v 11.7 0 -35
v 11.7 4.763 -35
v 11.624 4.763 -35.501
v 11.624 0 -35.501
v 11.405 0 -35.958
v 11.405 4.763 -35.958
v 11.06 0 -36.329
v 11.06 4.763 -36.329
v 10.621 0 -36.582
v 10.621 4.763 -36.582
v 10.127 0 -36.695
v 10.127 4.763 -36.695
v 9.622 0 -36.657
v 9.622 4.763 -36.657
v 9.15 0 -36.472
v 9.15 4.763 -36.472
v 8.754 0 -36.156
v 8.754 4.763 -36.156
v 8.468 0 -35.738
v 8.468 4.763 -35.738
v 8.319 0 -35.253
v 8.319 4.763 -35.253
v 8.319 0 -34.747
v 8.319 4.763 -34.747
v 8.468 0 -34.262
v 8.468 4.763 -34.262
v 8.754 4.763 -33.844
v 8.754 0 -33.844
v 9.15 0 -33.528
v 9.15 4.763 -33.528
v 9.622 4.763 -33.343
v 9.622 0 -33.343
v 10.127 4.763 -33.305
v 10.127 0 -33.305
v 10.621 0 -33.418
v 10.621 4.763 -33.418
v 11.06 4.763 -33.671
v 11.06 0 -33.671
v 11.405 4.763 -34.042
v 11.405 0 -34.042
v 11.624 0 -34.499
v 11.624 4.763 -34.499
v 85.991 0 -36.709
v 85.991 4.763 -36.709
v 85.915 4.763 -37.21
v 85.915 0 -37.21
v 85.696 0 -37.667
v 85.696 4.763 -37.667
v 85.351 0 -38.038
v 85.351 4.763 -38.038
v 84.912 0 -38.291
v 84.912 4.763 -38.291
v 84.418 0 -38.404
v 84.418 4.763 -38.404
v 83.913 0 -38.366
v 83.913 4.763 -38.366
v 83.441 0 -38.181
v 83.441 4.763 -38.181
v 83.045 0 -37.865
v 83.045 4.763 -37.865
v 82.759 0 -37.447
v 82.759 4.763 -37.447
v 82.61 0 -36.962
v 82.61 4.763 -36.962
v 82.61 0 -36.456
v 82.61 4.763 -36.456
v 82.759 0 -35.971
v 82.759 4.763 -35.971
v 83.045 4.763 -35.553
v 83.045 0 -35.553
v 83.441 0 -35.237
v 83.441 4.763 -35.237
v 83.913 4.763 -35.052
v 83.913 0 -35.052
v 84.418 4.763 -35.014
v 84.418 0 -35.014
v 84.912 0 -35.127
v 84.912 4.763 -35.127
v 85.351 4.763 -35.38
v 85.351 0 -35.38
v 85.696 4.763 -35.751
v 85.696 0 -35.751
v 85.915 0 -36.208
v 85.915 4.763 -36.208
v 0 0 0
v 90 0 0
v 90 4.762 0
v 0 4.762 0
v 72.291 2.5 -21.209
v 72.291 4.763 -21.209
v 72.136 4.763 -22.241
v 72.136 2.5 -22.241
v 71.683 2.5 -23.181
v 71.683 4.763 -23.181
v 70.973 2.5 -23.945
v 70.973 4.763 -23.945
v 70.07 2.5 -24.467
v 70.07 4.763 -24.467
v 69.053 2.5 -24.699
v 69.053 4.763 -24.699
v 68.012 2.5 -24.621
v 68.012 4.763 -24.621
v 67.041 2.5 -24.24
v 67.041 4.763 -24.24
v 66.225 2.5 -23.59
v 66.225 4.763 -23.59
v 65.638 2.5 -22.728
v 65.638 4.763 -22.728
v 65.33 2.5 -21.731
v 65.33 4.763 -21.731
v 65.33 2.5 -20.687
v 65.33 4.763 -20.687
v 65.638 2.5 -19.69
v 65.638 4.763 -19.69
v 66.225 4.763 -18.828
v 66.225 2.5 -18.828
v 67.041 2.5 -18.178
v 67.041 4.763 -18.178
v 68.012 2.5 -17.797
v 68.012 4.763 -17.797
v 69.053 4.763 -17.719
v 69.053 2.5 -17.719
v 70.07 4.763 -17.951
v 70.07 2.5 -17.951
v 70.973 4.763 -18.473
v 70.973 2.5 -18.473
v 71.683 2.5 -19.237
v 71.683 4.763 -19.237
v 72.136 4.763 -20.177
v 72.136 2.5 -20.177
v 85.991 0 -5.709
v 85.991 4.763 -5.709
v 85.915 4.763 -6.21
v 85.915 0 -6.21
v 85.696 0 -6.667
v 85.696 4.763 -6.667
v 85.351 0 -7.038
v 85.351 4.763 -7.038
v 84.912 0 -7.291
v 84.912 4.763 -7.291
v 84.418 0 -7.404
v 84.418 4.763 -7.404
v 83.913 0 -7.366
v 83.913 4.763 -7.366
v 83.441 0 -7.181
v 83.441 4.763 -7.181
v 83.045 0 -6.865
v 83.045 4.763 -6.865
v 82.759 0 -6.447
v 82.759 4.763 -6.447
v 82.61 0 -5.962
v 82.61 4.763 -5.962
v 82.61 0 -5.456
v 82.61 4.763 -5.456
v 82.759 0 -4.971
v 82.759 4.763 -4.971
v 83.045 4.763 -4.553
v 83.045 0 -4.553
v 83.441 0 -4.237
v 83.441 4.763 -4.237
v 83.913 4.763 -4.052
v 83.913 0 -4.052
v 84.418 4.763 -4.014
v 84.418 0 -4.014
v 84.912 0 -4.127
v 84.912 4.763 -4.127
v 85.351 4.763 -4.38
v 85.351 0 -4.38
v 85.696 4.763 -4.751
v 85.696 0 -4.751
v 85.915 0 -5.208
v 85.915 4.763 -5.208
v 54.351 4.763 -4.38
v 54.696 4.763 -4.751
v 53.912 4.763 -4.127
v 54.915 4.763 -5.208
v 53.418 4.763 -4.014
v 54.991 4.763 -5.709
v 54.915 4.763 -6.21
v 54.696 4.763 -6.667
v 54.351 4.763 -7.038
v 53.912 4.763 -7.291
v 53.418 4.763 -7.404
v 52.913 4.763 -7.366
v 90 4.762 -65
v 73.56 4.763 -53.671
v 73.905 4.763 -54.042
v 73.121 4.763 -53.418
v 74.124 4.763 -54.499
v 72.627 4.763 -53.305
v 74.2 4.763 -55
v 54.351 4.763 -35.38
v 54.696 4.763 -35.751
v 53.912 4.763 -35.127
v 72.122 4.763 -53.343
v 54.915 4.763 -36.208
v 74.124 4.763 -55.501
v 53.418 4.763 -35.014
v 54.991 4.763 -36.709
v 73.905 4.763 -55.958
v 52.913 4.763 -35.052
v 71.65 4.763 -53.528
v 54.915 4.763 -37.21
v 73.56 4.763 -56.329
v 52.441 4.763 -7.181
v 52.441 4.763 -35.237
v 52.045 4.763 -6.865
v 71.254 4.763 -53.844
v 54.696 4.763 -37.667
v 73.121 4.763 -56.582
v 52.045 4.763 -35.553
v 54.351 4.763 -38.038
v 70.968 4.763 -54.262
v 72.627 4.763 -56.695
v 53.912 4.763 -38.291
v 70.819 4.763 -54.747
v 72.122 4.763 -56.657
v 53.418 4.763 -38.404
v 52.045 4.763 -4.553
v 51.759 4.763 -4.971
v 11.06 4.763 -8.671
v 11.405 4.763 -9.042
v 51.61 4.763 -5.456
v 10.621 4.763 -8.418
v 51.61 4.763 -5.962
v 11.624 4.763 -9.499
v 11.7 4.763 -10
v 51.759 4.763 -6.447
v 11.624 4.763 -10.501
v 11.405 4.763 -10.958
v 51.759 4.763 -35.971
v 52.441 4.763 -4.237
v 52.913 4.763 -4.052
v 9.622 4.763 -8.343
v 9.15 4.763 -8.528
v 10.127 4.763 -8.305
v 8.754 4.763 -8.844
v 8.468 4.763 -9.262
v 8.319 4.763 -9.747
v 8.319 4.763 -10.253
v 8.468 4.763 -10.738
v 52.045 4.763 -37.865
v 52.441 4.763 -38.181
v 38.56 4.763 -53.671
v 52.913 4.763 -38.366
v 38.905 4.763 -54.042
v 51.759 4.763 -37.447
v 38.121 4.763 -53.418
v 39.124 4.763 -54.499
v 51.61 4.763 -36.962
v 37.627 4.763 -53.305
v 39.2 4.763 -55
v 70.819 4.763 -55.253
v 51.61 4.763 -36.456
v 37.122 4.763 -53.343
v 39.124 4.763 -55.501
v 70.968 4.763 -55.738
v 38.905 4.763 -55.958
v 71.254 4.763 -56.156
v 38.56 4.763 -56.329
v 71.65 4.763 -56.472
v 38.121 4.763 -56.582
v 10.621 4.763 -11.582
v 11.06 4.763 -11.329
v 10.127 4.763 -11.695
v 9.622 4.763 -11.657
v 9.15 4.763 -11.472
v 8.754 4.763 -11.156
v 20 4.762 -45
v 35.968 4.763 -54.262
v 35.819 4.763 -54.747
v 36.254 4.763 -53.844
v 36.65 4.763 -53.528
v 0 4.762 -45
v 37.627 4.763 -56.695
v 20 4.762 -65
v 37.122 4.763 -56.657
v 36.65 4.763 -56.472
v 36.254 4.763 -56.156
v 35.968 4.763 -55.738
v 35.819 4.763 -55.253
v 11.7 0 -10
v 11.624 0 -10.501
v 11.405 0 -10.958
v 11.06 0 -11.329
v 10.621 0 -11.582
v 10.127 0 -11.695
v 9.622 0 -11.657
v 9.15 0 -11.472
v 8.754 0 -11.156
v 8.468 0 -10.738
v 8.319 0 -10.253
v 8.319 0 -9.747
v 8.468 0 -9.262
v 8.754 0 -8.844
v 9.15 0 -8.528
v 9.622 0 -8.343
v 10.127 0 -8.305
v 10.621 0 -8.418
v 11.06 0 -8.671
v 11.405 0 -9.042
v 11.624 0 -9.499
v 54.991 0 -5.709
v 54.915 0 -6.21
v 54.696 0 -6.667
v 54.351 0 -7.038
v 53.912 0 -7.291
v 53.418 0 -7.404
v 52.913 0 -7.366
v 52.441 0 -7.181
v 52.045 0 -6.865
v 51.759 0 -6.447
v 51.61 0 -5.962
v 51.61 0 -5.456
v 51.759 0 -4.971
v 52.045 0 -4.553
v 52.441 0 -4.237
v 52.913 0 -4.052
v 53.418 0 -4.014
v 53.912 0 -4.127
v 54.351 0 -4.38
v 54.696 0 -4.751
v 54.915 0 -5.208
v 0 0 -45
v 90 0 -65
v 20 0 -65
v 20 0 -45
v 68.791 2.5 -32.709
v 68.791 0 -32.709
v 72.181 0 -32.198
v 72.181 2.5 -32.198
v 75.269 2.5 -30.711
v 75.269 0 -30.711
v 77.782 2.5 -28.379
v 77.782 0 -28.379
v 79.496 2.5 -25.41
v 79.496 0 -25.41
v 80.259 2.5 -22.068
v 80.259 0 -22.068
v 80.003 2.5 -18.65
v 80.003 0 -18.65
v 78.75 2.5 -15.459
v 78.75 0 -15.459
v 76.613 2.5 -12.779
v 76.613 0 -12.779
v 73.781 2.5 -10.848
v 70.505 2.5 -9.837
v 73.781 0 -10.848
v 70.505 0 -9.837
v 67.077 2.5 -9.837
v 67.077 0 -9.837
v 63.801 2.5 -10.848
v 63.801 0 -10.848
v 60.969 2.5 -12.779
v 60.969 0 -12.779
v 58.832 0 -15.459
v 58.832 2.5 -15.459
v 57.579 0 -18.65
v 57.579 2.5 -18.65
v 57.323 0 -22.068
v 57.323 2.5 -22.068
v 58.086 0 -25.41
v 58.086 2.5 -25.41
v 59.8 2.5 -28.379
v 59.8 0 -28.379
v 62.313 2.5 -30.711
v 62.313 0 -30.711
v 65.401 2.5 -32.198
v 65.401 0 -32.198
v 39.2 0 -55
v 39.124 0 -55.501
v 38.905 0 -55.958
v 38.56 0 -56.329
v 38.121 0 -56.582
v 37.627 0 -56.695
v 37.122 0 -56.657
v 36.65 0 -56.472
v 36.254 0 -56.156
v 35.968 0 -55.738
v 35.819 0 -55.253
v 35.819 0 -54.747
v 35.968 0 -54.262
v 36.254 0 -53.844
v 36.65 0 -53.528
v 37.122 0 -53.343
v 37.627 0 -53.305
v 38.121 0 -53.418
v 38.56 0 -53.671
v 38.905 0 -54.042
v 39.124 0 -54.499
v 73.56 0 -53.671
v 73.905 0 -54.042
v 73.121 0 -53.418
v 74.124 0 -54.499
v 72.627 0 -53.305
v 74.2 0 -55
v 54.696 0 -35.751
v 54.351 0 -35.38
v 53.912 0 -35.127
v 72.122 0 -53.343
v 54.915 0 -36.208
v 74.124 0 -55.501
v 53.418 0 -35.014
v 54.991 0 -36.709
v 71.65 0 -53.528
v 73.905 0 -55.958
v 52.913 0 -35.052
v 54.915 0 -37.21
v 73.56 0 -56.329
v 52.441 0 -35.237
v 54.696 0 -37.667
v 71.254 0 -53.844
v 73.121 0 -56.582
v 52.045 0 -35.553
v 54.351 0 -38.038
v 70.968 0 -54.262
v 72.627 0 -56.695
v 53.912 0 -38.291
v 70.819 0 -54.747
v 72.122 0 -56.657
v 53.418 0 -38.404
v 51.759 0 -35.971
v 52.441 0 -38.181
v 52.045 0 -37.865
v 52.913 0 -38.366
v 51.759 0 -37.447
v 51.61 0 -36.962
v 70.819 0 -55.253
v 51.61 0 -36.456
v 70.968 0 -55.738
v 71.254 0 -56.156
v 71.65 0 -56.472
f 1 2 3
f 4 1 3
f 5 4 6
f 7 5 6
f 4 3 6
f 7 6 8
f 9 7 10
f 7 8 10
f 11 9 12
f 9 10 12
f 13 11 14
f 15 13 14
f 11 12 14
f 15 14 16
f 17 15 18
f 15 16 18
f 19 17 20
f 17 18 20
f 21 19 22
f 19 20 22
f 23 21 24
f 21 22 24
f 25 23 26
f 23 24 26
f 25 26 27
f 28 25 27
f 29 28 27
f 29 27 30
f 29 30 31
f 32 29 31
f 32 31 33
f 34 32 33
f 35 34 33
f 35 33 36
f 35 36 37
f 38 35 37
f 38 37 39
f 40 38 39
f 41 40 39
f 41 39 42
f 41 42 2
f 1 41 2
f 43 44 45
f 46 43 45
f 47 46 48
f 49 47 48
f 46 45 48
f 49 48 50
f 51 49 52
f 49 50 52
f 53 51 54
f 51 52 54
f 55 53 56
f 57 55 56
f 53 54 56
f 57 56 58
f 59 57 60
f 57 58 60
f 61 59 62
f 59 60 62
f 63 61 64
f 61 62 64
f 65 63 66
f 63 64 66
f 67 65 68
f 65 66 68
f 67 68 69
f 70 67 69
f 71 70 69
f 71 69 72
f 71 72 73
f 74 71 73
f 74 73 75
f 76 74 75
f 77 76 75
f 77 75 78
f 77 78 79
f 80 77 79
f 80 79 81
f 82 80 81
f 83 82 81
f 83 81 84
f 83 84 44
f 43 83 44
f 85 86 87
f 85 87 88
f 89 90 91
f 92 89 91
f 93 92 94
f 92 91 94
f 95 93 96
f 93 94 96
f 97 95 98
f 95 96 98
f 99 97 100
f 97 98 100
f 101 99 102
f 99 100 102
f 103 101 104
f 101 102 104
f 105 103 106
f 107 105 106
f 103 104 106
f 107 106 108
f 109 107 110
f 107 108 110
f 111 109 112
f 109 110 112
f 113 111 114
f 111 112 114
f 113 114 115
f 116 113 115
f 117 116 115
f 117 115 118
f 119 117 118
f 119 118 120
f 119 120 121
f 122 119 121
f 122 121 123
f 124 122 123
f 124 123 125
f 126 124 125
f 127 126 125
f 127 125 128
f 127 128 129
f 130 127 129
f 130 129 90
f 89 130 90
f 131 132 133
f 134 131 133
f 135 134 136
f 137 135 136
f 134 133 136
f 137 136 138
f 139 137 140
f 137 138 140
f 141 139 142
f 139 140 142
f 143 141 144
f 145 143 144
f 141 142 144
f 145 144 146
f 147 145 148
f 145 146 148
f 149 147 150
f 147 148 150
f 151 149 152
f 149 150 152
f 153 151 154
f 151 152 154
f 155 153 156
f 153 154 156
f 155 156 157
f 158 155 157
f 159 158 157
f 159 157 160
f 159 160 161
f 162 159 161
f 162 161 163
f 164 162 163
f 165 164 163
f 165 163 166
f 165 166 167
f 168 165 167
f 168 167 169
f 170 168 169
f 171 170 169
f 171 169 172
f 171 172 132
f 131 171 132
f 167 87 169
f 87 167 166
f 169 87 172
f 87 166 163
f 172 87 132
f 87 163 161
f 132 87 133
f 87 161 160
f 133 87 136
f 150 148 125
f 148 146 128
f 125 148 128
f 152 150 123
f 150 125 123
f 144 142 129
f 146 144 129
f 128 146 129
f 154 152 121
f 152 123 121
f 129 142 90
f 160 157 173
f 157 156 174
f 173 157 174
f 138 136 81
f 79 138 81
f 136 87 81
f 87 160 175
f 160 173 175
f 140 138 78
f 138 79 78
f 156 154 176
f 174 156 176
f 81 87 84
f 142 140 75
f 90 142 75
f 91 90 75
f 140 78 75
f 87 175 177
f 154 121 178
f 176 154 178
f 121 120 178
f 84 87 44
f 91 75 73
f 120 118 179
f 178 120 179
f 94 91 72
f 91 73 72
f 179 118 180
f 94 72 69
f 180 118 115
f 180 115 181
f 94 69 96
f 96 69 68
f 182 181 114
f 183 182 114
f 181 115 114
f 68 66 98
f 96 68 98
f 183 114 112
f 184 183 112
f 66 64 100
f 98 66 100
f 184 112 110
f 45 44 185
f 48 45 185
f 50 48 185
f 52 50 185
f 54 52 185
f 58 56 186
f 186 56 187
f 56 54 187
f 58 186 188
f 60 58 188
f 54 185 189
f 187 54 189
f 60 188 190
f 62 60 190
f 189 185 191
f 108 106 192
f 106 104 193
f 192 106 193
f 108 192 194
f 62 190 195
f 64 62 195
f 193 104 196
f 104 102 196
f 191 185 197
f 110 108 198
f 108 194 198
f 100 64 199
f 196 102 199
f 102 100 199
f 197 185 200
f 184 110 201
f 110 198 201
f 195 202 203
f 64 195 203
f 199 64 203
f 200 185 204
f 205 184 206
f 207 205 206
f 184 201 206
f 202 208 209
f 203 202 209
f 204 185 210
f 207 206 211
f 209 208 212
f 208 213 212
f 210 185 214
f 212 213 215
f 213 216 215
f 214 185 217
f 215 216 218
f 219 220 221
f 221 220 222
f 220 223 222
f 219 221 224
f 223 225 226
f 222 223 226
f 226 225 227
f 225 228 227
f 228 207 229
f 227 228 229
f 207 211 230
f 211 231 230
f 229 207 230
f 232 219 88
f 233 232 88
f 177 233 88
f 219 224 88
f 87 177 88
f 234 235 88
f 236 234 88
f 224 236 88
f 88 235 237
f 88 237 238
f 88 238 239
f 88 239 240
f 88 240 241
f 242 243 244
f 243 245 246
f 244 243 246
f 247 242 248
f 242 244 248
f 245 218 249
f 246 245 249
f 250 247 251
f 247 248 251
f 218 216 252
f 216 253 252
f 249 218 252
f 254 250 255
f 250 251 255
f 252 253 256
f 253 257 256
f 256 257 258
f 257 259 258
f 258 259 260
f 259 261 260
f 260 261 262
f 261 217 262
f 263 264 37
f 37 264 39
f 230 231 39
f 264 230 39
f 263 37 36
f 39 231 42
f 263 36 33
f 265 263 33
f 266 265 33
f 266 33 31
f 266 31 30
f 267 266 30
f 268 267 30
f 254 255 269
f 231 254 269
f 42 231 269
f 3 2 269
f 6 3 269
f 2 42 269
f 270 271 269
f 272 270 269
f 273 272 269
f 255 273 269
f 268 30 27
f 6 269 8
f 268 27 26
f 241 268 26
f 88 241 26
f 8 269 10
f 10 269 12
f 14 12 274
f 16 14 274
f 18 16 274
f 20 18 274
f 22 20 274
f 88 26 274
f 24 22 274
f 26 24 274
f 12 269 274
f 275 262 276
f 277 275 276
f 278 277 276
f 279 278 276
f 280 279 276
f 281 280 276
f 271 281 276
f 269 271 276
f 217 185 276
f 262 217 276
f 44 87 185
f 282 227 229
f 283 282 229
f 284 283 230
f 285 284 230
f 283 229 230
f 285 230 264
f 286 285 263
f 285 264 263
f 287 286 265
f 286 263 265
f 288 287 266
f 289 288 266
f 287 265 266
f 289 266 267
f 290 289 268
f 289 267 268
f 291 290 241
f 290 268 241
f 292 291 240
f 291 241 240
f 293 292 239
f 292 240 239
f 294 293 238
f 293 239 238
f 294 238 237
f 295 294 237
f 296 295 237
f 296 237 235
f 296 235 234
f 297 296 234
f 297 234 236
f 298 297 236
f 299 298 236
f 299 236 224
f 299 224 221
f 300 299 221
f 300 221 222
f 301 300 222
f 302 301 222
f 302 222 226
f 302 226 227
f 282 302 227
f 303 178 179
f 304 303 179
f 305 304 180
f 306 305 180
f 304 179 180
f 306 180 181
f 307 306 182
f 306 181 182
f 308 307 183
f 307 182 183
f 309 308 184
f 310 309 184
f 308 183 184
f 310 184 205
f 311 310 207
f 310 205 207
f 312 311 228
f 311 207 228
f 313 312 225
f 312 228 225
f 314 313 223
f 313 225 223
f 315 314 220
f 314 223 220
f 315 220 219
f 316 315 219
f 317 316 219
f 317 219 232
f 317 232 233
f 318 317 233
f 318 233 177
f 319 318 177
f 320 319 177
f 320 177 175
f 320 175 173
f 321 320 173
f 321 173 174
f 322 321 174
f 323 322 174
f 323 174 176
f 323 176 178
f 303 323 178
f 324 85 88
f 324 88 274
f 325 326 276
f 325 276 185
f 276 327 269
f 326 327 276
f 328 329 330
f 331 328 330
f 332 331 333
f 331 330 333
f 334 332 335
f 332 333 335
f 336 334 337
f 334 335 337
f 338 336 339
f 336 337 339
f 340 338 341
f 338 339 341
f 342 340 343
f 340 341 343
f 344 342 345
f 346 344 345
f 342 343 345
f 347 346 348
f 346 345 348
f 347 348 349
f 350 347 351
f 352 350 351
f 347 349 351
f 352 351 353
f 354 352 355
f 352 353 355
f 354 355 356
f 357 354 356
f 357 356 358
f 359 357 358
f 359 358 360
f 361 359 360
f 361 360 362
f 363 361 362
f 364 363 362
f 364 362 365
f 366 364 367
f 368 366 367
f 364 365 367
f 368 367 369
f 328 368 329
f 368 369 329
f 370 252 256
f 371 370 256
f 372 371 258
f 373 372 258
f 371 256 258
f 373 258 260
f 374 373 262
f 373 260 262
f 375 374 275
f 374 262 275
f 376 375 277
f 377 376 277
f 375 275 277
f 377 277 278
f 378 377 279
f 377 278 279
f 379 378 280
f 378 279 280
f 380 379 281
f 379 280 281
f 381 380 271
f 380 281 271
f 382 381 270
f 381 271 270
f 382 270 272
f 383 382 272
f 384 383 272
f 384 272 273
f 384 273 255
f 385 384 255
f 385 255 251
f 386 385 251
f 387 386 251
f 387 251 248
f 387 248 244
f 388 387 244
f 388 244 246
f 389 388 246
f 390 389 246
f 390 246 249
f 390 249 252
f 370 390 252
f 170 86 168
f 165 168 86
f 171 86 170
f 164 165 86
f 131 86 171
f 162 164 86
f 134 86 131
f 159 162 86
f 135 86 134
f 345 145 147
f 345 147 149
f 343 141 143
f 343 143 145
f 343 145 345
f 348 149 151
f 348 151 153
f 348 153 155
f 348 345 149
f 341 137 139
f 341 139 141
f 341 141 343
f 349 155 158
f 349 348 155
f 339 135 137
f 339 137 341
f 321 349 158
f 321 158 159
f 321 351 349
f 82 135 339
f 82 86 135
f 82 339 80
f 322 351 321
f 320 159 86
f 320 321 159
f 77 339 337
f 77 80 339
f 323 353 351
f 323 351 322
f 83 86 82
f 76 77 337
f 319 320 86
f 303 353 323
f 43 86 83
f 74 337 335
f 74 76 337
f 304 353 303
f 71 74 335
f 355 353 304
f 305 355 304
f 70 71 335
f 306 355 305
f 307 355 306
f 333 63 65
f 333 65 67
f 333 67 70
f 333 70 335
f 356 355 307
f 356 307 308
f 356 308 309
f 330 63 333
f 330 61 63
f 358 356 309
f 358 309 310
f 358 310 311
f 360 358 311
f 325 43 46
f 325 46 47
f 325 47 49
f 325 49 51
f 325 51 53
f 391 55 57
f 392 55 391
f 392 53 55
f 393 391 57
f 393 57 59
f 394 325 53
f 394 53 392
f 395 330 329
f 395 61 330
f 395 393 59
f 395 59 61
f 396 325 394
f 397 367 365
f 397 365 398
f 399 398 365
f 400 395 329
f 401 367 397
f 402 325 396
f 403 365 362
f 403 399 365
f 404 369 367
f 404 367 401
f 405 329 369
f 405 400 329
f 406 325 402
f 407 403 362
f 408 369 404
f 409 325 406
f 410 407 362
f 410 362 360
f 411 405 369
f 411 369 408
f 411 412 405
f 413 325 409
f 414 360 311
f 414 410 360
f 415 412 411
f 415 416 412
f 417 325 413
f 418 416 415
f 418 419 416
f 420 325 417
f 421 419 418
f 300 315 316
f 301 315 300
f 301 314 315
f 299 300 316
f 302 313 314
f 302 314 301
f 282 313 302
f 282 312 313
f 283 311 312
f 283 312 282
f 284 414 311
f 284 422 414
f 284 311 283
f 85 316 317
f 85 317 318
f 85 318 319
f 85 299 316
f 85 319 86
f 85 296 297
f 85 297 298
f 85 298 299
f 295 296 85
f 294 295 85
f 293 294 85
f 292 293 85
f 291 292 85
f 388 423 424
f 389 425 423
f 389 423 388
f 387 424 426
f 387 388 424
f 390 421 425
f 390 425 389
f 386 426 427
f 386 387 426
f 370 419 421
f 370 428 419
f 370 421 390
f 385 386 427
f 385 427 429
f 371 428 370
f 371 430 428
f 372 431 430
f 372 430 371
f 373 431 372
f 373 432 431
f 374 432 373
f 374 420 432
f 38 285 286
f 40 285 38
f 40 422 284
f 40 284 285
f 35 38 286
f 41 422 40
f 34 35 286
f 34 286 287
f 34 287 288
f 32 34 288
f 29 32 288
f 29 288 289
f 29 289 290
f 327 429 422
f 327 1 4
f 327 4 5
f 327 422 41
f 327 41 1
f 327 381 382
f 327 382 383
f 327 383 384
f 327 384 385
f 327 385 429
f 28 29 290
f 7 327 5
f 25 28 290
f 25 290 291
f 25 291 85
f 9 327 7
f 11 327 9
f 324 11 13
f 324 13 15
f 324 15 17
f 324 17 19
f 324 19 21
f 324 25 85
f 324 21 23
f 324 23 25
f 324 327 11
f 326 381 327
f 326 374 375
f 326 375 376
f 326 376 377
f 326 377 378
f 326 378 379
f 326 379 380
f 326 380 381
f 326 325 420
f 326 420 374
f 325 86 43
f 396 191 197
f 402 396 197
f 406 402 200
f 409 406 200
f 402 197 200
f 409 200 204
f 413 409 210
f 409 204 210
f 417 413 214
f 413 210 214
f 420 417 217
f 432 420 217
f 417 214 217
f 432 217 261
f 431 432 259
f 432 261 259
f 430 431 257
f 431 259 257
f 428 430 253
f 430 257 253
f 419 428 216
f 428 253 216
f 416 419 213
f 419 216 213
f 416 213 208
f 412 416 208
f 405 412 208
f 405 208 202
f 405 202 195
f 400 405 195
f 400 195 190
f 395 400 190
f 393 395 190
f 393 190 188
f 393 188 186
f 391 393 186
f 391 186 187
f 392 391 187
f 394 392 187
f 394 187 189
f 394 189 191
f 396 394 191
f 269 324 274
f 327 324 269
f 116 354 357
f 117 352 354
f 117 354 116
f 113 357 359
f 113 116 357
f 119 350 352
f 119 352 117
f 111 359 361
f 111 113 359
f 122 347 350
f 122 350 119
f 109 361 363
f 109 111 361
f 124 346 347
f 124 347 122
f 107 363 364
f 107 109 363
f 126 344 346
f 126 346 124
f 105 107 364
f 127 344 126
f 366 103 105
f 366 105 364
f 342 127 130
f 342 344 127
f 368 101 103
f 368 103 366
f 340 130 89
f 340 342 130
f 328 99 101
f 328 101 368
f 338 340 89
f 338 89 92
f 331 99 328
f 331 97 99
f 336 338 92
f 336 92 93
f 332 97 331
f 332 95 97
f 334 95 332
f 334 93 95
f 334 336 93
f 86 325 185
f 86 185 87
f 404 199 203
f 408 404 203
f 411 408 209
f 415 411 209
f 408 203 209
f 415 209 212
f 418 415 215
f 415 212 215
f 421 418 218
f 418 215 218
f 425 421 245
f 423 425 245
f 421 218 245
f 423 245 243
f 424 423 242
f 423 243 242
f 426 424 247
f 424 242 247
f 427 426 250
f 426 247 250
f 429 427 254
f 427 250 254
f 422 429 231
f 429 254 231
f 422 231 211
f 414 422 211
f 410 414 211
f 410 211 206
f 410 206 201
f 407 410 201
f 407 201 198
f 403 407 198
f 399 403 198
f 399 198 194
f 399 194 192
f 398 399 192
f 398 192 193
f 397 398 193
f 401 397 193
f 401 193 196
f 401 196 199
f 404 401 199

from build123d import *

# Parameters (mm, degrees)
BOSS_EXTRUDE1_DEPTH      = 4.7625
F_7_0_7_DIAMETER_HOLE1_D = 7
SKETCH12_R               = 11.5
CUT_EXTRUDE1_DEPTH       = 2.5
M3_CLEARANCE_HOLE1_D     = 3.4


with BuildPart() as part:
    # Sketch1 → Boss-Extrude1 (new body)
    with BuildSketch(Plane(origin=(0, 0, 0), x_dir=(1, 0, 0), z_dir=(0, 1, 0))):
        Polygon((0, 0), (0, 45), (20, 45), (20, 65), (90, 65), (90, 0), align=None)
    extrude(amount=BOSS_EXTRUDE1_DEPTH)

    # Ø7.0 (7) Diameter Hole1 (through all)
    with Locations(Plane(origin=(0, 0, 0), x_dir=(-1, 0, 0), z_dir=(0, -1, 0))):
        with Locations((-68.791, 21.209)):
            Hole(F_7_0_7_DIAMETER_HOLE1_D / 2)

    # Sketch12 → Cut-Extrude1 (cut)
    with BuildSketch(Plane.XZ):
        with Locations(Location((68.791, -21.209, 0), (0, 0, 270))):
            Circle(SKETCH12_R)
    extrude(amount=-CUT_EXTRUDE1_DEPTH, mode=Mode.SUBTRACT)

    # M3 Clearance Hole1 (through all)
    with Locations(Plane(origin=(0, 0, 0), x_dir=(-1, 0, 0), z_dir=(0, -1, 0))):
        with Locations((-10, 10), (-10, 35), (-37.5, 55), (-72.5, 55), (-84.291, 36.709), (-84.291, 5.709), (-53.291, 5.709), (-53.291, 36.709)):
            Hole(M3_CLEARANCE_HOLE1_D / 2)


solid = part.part
